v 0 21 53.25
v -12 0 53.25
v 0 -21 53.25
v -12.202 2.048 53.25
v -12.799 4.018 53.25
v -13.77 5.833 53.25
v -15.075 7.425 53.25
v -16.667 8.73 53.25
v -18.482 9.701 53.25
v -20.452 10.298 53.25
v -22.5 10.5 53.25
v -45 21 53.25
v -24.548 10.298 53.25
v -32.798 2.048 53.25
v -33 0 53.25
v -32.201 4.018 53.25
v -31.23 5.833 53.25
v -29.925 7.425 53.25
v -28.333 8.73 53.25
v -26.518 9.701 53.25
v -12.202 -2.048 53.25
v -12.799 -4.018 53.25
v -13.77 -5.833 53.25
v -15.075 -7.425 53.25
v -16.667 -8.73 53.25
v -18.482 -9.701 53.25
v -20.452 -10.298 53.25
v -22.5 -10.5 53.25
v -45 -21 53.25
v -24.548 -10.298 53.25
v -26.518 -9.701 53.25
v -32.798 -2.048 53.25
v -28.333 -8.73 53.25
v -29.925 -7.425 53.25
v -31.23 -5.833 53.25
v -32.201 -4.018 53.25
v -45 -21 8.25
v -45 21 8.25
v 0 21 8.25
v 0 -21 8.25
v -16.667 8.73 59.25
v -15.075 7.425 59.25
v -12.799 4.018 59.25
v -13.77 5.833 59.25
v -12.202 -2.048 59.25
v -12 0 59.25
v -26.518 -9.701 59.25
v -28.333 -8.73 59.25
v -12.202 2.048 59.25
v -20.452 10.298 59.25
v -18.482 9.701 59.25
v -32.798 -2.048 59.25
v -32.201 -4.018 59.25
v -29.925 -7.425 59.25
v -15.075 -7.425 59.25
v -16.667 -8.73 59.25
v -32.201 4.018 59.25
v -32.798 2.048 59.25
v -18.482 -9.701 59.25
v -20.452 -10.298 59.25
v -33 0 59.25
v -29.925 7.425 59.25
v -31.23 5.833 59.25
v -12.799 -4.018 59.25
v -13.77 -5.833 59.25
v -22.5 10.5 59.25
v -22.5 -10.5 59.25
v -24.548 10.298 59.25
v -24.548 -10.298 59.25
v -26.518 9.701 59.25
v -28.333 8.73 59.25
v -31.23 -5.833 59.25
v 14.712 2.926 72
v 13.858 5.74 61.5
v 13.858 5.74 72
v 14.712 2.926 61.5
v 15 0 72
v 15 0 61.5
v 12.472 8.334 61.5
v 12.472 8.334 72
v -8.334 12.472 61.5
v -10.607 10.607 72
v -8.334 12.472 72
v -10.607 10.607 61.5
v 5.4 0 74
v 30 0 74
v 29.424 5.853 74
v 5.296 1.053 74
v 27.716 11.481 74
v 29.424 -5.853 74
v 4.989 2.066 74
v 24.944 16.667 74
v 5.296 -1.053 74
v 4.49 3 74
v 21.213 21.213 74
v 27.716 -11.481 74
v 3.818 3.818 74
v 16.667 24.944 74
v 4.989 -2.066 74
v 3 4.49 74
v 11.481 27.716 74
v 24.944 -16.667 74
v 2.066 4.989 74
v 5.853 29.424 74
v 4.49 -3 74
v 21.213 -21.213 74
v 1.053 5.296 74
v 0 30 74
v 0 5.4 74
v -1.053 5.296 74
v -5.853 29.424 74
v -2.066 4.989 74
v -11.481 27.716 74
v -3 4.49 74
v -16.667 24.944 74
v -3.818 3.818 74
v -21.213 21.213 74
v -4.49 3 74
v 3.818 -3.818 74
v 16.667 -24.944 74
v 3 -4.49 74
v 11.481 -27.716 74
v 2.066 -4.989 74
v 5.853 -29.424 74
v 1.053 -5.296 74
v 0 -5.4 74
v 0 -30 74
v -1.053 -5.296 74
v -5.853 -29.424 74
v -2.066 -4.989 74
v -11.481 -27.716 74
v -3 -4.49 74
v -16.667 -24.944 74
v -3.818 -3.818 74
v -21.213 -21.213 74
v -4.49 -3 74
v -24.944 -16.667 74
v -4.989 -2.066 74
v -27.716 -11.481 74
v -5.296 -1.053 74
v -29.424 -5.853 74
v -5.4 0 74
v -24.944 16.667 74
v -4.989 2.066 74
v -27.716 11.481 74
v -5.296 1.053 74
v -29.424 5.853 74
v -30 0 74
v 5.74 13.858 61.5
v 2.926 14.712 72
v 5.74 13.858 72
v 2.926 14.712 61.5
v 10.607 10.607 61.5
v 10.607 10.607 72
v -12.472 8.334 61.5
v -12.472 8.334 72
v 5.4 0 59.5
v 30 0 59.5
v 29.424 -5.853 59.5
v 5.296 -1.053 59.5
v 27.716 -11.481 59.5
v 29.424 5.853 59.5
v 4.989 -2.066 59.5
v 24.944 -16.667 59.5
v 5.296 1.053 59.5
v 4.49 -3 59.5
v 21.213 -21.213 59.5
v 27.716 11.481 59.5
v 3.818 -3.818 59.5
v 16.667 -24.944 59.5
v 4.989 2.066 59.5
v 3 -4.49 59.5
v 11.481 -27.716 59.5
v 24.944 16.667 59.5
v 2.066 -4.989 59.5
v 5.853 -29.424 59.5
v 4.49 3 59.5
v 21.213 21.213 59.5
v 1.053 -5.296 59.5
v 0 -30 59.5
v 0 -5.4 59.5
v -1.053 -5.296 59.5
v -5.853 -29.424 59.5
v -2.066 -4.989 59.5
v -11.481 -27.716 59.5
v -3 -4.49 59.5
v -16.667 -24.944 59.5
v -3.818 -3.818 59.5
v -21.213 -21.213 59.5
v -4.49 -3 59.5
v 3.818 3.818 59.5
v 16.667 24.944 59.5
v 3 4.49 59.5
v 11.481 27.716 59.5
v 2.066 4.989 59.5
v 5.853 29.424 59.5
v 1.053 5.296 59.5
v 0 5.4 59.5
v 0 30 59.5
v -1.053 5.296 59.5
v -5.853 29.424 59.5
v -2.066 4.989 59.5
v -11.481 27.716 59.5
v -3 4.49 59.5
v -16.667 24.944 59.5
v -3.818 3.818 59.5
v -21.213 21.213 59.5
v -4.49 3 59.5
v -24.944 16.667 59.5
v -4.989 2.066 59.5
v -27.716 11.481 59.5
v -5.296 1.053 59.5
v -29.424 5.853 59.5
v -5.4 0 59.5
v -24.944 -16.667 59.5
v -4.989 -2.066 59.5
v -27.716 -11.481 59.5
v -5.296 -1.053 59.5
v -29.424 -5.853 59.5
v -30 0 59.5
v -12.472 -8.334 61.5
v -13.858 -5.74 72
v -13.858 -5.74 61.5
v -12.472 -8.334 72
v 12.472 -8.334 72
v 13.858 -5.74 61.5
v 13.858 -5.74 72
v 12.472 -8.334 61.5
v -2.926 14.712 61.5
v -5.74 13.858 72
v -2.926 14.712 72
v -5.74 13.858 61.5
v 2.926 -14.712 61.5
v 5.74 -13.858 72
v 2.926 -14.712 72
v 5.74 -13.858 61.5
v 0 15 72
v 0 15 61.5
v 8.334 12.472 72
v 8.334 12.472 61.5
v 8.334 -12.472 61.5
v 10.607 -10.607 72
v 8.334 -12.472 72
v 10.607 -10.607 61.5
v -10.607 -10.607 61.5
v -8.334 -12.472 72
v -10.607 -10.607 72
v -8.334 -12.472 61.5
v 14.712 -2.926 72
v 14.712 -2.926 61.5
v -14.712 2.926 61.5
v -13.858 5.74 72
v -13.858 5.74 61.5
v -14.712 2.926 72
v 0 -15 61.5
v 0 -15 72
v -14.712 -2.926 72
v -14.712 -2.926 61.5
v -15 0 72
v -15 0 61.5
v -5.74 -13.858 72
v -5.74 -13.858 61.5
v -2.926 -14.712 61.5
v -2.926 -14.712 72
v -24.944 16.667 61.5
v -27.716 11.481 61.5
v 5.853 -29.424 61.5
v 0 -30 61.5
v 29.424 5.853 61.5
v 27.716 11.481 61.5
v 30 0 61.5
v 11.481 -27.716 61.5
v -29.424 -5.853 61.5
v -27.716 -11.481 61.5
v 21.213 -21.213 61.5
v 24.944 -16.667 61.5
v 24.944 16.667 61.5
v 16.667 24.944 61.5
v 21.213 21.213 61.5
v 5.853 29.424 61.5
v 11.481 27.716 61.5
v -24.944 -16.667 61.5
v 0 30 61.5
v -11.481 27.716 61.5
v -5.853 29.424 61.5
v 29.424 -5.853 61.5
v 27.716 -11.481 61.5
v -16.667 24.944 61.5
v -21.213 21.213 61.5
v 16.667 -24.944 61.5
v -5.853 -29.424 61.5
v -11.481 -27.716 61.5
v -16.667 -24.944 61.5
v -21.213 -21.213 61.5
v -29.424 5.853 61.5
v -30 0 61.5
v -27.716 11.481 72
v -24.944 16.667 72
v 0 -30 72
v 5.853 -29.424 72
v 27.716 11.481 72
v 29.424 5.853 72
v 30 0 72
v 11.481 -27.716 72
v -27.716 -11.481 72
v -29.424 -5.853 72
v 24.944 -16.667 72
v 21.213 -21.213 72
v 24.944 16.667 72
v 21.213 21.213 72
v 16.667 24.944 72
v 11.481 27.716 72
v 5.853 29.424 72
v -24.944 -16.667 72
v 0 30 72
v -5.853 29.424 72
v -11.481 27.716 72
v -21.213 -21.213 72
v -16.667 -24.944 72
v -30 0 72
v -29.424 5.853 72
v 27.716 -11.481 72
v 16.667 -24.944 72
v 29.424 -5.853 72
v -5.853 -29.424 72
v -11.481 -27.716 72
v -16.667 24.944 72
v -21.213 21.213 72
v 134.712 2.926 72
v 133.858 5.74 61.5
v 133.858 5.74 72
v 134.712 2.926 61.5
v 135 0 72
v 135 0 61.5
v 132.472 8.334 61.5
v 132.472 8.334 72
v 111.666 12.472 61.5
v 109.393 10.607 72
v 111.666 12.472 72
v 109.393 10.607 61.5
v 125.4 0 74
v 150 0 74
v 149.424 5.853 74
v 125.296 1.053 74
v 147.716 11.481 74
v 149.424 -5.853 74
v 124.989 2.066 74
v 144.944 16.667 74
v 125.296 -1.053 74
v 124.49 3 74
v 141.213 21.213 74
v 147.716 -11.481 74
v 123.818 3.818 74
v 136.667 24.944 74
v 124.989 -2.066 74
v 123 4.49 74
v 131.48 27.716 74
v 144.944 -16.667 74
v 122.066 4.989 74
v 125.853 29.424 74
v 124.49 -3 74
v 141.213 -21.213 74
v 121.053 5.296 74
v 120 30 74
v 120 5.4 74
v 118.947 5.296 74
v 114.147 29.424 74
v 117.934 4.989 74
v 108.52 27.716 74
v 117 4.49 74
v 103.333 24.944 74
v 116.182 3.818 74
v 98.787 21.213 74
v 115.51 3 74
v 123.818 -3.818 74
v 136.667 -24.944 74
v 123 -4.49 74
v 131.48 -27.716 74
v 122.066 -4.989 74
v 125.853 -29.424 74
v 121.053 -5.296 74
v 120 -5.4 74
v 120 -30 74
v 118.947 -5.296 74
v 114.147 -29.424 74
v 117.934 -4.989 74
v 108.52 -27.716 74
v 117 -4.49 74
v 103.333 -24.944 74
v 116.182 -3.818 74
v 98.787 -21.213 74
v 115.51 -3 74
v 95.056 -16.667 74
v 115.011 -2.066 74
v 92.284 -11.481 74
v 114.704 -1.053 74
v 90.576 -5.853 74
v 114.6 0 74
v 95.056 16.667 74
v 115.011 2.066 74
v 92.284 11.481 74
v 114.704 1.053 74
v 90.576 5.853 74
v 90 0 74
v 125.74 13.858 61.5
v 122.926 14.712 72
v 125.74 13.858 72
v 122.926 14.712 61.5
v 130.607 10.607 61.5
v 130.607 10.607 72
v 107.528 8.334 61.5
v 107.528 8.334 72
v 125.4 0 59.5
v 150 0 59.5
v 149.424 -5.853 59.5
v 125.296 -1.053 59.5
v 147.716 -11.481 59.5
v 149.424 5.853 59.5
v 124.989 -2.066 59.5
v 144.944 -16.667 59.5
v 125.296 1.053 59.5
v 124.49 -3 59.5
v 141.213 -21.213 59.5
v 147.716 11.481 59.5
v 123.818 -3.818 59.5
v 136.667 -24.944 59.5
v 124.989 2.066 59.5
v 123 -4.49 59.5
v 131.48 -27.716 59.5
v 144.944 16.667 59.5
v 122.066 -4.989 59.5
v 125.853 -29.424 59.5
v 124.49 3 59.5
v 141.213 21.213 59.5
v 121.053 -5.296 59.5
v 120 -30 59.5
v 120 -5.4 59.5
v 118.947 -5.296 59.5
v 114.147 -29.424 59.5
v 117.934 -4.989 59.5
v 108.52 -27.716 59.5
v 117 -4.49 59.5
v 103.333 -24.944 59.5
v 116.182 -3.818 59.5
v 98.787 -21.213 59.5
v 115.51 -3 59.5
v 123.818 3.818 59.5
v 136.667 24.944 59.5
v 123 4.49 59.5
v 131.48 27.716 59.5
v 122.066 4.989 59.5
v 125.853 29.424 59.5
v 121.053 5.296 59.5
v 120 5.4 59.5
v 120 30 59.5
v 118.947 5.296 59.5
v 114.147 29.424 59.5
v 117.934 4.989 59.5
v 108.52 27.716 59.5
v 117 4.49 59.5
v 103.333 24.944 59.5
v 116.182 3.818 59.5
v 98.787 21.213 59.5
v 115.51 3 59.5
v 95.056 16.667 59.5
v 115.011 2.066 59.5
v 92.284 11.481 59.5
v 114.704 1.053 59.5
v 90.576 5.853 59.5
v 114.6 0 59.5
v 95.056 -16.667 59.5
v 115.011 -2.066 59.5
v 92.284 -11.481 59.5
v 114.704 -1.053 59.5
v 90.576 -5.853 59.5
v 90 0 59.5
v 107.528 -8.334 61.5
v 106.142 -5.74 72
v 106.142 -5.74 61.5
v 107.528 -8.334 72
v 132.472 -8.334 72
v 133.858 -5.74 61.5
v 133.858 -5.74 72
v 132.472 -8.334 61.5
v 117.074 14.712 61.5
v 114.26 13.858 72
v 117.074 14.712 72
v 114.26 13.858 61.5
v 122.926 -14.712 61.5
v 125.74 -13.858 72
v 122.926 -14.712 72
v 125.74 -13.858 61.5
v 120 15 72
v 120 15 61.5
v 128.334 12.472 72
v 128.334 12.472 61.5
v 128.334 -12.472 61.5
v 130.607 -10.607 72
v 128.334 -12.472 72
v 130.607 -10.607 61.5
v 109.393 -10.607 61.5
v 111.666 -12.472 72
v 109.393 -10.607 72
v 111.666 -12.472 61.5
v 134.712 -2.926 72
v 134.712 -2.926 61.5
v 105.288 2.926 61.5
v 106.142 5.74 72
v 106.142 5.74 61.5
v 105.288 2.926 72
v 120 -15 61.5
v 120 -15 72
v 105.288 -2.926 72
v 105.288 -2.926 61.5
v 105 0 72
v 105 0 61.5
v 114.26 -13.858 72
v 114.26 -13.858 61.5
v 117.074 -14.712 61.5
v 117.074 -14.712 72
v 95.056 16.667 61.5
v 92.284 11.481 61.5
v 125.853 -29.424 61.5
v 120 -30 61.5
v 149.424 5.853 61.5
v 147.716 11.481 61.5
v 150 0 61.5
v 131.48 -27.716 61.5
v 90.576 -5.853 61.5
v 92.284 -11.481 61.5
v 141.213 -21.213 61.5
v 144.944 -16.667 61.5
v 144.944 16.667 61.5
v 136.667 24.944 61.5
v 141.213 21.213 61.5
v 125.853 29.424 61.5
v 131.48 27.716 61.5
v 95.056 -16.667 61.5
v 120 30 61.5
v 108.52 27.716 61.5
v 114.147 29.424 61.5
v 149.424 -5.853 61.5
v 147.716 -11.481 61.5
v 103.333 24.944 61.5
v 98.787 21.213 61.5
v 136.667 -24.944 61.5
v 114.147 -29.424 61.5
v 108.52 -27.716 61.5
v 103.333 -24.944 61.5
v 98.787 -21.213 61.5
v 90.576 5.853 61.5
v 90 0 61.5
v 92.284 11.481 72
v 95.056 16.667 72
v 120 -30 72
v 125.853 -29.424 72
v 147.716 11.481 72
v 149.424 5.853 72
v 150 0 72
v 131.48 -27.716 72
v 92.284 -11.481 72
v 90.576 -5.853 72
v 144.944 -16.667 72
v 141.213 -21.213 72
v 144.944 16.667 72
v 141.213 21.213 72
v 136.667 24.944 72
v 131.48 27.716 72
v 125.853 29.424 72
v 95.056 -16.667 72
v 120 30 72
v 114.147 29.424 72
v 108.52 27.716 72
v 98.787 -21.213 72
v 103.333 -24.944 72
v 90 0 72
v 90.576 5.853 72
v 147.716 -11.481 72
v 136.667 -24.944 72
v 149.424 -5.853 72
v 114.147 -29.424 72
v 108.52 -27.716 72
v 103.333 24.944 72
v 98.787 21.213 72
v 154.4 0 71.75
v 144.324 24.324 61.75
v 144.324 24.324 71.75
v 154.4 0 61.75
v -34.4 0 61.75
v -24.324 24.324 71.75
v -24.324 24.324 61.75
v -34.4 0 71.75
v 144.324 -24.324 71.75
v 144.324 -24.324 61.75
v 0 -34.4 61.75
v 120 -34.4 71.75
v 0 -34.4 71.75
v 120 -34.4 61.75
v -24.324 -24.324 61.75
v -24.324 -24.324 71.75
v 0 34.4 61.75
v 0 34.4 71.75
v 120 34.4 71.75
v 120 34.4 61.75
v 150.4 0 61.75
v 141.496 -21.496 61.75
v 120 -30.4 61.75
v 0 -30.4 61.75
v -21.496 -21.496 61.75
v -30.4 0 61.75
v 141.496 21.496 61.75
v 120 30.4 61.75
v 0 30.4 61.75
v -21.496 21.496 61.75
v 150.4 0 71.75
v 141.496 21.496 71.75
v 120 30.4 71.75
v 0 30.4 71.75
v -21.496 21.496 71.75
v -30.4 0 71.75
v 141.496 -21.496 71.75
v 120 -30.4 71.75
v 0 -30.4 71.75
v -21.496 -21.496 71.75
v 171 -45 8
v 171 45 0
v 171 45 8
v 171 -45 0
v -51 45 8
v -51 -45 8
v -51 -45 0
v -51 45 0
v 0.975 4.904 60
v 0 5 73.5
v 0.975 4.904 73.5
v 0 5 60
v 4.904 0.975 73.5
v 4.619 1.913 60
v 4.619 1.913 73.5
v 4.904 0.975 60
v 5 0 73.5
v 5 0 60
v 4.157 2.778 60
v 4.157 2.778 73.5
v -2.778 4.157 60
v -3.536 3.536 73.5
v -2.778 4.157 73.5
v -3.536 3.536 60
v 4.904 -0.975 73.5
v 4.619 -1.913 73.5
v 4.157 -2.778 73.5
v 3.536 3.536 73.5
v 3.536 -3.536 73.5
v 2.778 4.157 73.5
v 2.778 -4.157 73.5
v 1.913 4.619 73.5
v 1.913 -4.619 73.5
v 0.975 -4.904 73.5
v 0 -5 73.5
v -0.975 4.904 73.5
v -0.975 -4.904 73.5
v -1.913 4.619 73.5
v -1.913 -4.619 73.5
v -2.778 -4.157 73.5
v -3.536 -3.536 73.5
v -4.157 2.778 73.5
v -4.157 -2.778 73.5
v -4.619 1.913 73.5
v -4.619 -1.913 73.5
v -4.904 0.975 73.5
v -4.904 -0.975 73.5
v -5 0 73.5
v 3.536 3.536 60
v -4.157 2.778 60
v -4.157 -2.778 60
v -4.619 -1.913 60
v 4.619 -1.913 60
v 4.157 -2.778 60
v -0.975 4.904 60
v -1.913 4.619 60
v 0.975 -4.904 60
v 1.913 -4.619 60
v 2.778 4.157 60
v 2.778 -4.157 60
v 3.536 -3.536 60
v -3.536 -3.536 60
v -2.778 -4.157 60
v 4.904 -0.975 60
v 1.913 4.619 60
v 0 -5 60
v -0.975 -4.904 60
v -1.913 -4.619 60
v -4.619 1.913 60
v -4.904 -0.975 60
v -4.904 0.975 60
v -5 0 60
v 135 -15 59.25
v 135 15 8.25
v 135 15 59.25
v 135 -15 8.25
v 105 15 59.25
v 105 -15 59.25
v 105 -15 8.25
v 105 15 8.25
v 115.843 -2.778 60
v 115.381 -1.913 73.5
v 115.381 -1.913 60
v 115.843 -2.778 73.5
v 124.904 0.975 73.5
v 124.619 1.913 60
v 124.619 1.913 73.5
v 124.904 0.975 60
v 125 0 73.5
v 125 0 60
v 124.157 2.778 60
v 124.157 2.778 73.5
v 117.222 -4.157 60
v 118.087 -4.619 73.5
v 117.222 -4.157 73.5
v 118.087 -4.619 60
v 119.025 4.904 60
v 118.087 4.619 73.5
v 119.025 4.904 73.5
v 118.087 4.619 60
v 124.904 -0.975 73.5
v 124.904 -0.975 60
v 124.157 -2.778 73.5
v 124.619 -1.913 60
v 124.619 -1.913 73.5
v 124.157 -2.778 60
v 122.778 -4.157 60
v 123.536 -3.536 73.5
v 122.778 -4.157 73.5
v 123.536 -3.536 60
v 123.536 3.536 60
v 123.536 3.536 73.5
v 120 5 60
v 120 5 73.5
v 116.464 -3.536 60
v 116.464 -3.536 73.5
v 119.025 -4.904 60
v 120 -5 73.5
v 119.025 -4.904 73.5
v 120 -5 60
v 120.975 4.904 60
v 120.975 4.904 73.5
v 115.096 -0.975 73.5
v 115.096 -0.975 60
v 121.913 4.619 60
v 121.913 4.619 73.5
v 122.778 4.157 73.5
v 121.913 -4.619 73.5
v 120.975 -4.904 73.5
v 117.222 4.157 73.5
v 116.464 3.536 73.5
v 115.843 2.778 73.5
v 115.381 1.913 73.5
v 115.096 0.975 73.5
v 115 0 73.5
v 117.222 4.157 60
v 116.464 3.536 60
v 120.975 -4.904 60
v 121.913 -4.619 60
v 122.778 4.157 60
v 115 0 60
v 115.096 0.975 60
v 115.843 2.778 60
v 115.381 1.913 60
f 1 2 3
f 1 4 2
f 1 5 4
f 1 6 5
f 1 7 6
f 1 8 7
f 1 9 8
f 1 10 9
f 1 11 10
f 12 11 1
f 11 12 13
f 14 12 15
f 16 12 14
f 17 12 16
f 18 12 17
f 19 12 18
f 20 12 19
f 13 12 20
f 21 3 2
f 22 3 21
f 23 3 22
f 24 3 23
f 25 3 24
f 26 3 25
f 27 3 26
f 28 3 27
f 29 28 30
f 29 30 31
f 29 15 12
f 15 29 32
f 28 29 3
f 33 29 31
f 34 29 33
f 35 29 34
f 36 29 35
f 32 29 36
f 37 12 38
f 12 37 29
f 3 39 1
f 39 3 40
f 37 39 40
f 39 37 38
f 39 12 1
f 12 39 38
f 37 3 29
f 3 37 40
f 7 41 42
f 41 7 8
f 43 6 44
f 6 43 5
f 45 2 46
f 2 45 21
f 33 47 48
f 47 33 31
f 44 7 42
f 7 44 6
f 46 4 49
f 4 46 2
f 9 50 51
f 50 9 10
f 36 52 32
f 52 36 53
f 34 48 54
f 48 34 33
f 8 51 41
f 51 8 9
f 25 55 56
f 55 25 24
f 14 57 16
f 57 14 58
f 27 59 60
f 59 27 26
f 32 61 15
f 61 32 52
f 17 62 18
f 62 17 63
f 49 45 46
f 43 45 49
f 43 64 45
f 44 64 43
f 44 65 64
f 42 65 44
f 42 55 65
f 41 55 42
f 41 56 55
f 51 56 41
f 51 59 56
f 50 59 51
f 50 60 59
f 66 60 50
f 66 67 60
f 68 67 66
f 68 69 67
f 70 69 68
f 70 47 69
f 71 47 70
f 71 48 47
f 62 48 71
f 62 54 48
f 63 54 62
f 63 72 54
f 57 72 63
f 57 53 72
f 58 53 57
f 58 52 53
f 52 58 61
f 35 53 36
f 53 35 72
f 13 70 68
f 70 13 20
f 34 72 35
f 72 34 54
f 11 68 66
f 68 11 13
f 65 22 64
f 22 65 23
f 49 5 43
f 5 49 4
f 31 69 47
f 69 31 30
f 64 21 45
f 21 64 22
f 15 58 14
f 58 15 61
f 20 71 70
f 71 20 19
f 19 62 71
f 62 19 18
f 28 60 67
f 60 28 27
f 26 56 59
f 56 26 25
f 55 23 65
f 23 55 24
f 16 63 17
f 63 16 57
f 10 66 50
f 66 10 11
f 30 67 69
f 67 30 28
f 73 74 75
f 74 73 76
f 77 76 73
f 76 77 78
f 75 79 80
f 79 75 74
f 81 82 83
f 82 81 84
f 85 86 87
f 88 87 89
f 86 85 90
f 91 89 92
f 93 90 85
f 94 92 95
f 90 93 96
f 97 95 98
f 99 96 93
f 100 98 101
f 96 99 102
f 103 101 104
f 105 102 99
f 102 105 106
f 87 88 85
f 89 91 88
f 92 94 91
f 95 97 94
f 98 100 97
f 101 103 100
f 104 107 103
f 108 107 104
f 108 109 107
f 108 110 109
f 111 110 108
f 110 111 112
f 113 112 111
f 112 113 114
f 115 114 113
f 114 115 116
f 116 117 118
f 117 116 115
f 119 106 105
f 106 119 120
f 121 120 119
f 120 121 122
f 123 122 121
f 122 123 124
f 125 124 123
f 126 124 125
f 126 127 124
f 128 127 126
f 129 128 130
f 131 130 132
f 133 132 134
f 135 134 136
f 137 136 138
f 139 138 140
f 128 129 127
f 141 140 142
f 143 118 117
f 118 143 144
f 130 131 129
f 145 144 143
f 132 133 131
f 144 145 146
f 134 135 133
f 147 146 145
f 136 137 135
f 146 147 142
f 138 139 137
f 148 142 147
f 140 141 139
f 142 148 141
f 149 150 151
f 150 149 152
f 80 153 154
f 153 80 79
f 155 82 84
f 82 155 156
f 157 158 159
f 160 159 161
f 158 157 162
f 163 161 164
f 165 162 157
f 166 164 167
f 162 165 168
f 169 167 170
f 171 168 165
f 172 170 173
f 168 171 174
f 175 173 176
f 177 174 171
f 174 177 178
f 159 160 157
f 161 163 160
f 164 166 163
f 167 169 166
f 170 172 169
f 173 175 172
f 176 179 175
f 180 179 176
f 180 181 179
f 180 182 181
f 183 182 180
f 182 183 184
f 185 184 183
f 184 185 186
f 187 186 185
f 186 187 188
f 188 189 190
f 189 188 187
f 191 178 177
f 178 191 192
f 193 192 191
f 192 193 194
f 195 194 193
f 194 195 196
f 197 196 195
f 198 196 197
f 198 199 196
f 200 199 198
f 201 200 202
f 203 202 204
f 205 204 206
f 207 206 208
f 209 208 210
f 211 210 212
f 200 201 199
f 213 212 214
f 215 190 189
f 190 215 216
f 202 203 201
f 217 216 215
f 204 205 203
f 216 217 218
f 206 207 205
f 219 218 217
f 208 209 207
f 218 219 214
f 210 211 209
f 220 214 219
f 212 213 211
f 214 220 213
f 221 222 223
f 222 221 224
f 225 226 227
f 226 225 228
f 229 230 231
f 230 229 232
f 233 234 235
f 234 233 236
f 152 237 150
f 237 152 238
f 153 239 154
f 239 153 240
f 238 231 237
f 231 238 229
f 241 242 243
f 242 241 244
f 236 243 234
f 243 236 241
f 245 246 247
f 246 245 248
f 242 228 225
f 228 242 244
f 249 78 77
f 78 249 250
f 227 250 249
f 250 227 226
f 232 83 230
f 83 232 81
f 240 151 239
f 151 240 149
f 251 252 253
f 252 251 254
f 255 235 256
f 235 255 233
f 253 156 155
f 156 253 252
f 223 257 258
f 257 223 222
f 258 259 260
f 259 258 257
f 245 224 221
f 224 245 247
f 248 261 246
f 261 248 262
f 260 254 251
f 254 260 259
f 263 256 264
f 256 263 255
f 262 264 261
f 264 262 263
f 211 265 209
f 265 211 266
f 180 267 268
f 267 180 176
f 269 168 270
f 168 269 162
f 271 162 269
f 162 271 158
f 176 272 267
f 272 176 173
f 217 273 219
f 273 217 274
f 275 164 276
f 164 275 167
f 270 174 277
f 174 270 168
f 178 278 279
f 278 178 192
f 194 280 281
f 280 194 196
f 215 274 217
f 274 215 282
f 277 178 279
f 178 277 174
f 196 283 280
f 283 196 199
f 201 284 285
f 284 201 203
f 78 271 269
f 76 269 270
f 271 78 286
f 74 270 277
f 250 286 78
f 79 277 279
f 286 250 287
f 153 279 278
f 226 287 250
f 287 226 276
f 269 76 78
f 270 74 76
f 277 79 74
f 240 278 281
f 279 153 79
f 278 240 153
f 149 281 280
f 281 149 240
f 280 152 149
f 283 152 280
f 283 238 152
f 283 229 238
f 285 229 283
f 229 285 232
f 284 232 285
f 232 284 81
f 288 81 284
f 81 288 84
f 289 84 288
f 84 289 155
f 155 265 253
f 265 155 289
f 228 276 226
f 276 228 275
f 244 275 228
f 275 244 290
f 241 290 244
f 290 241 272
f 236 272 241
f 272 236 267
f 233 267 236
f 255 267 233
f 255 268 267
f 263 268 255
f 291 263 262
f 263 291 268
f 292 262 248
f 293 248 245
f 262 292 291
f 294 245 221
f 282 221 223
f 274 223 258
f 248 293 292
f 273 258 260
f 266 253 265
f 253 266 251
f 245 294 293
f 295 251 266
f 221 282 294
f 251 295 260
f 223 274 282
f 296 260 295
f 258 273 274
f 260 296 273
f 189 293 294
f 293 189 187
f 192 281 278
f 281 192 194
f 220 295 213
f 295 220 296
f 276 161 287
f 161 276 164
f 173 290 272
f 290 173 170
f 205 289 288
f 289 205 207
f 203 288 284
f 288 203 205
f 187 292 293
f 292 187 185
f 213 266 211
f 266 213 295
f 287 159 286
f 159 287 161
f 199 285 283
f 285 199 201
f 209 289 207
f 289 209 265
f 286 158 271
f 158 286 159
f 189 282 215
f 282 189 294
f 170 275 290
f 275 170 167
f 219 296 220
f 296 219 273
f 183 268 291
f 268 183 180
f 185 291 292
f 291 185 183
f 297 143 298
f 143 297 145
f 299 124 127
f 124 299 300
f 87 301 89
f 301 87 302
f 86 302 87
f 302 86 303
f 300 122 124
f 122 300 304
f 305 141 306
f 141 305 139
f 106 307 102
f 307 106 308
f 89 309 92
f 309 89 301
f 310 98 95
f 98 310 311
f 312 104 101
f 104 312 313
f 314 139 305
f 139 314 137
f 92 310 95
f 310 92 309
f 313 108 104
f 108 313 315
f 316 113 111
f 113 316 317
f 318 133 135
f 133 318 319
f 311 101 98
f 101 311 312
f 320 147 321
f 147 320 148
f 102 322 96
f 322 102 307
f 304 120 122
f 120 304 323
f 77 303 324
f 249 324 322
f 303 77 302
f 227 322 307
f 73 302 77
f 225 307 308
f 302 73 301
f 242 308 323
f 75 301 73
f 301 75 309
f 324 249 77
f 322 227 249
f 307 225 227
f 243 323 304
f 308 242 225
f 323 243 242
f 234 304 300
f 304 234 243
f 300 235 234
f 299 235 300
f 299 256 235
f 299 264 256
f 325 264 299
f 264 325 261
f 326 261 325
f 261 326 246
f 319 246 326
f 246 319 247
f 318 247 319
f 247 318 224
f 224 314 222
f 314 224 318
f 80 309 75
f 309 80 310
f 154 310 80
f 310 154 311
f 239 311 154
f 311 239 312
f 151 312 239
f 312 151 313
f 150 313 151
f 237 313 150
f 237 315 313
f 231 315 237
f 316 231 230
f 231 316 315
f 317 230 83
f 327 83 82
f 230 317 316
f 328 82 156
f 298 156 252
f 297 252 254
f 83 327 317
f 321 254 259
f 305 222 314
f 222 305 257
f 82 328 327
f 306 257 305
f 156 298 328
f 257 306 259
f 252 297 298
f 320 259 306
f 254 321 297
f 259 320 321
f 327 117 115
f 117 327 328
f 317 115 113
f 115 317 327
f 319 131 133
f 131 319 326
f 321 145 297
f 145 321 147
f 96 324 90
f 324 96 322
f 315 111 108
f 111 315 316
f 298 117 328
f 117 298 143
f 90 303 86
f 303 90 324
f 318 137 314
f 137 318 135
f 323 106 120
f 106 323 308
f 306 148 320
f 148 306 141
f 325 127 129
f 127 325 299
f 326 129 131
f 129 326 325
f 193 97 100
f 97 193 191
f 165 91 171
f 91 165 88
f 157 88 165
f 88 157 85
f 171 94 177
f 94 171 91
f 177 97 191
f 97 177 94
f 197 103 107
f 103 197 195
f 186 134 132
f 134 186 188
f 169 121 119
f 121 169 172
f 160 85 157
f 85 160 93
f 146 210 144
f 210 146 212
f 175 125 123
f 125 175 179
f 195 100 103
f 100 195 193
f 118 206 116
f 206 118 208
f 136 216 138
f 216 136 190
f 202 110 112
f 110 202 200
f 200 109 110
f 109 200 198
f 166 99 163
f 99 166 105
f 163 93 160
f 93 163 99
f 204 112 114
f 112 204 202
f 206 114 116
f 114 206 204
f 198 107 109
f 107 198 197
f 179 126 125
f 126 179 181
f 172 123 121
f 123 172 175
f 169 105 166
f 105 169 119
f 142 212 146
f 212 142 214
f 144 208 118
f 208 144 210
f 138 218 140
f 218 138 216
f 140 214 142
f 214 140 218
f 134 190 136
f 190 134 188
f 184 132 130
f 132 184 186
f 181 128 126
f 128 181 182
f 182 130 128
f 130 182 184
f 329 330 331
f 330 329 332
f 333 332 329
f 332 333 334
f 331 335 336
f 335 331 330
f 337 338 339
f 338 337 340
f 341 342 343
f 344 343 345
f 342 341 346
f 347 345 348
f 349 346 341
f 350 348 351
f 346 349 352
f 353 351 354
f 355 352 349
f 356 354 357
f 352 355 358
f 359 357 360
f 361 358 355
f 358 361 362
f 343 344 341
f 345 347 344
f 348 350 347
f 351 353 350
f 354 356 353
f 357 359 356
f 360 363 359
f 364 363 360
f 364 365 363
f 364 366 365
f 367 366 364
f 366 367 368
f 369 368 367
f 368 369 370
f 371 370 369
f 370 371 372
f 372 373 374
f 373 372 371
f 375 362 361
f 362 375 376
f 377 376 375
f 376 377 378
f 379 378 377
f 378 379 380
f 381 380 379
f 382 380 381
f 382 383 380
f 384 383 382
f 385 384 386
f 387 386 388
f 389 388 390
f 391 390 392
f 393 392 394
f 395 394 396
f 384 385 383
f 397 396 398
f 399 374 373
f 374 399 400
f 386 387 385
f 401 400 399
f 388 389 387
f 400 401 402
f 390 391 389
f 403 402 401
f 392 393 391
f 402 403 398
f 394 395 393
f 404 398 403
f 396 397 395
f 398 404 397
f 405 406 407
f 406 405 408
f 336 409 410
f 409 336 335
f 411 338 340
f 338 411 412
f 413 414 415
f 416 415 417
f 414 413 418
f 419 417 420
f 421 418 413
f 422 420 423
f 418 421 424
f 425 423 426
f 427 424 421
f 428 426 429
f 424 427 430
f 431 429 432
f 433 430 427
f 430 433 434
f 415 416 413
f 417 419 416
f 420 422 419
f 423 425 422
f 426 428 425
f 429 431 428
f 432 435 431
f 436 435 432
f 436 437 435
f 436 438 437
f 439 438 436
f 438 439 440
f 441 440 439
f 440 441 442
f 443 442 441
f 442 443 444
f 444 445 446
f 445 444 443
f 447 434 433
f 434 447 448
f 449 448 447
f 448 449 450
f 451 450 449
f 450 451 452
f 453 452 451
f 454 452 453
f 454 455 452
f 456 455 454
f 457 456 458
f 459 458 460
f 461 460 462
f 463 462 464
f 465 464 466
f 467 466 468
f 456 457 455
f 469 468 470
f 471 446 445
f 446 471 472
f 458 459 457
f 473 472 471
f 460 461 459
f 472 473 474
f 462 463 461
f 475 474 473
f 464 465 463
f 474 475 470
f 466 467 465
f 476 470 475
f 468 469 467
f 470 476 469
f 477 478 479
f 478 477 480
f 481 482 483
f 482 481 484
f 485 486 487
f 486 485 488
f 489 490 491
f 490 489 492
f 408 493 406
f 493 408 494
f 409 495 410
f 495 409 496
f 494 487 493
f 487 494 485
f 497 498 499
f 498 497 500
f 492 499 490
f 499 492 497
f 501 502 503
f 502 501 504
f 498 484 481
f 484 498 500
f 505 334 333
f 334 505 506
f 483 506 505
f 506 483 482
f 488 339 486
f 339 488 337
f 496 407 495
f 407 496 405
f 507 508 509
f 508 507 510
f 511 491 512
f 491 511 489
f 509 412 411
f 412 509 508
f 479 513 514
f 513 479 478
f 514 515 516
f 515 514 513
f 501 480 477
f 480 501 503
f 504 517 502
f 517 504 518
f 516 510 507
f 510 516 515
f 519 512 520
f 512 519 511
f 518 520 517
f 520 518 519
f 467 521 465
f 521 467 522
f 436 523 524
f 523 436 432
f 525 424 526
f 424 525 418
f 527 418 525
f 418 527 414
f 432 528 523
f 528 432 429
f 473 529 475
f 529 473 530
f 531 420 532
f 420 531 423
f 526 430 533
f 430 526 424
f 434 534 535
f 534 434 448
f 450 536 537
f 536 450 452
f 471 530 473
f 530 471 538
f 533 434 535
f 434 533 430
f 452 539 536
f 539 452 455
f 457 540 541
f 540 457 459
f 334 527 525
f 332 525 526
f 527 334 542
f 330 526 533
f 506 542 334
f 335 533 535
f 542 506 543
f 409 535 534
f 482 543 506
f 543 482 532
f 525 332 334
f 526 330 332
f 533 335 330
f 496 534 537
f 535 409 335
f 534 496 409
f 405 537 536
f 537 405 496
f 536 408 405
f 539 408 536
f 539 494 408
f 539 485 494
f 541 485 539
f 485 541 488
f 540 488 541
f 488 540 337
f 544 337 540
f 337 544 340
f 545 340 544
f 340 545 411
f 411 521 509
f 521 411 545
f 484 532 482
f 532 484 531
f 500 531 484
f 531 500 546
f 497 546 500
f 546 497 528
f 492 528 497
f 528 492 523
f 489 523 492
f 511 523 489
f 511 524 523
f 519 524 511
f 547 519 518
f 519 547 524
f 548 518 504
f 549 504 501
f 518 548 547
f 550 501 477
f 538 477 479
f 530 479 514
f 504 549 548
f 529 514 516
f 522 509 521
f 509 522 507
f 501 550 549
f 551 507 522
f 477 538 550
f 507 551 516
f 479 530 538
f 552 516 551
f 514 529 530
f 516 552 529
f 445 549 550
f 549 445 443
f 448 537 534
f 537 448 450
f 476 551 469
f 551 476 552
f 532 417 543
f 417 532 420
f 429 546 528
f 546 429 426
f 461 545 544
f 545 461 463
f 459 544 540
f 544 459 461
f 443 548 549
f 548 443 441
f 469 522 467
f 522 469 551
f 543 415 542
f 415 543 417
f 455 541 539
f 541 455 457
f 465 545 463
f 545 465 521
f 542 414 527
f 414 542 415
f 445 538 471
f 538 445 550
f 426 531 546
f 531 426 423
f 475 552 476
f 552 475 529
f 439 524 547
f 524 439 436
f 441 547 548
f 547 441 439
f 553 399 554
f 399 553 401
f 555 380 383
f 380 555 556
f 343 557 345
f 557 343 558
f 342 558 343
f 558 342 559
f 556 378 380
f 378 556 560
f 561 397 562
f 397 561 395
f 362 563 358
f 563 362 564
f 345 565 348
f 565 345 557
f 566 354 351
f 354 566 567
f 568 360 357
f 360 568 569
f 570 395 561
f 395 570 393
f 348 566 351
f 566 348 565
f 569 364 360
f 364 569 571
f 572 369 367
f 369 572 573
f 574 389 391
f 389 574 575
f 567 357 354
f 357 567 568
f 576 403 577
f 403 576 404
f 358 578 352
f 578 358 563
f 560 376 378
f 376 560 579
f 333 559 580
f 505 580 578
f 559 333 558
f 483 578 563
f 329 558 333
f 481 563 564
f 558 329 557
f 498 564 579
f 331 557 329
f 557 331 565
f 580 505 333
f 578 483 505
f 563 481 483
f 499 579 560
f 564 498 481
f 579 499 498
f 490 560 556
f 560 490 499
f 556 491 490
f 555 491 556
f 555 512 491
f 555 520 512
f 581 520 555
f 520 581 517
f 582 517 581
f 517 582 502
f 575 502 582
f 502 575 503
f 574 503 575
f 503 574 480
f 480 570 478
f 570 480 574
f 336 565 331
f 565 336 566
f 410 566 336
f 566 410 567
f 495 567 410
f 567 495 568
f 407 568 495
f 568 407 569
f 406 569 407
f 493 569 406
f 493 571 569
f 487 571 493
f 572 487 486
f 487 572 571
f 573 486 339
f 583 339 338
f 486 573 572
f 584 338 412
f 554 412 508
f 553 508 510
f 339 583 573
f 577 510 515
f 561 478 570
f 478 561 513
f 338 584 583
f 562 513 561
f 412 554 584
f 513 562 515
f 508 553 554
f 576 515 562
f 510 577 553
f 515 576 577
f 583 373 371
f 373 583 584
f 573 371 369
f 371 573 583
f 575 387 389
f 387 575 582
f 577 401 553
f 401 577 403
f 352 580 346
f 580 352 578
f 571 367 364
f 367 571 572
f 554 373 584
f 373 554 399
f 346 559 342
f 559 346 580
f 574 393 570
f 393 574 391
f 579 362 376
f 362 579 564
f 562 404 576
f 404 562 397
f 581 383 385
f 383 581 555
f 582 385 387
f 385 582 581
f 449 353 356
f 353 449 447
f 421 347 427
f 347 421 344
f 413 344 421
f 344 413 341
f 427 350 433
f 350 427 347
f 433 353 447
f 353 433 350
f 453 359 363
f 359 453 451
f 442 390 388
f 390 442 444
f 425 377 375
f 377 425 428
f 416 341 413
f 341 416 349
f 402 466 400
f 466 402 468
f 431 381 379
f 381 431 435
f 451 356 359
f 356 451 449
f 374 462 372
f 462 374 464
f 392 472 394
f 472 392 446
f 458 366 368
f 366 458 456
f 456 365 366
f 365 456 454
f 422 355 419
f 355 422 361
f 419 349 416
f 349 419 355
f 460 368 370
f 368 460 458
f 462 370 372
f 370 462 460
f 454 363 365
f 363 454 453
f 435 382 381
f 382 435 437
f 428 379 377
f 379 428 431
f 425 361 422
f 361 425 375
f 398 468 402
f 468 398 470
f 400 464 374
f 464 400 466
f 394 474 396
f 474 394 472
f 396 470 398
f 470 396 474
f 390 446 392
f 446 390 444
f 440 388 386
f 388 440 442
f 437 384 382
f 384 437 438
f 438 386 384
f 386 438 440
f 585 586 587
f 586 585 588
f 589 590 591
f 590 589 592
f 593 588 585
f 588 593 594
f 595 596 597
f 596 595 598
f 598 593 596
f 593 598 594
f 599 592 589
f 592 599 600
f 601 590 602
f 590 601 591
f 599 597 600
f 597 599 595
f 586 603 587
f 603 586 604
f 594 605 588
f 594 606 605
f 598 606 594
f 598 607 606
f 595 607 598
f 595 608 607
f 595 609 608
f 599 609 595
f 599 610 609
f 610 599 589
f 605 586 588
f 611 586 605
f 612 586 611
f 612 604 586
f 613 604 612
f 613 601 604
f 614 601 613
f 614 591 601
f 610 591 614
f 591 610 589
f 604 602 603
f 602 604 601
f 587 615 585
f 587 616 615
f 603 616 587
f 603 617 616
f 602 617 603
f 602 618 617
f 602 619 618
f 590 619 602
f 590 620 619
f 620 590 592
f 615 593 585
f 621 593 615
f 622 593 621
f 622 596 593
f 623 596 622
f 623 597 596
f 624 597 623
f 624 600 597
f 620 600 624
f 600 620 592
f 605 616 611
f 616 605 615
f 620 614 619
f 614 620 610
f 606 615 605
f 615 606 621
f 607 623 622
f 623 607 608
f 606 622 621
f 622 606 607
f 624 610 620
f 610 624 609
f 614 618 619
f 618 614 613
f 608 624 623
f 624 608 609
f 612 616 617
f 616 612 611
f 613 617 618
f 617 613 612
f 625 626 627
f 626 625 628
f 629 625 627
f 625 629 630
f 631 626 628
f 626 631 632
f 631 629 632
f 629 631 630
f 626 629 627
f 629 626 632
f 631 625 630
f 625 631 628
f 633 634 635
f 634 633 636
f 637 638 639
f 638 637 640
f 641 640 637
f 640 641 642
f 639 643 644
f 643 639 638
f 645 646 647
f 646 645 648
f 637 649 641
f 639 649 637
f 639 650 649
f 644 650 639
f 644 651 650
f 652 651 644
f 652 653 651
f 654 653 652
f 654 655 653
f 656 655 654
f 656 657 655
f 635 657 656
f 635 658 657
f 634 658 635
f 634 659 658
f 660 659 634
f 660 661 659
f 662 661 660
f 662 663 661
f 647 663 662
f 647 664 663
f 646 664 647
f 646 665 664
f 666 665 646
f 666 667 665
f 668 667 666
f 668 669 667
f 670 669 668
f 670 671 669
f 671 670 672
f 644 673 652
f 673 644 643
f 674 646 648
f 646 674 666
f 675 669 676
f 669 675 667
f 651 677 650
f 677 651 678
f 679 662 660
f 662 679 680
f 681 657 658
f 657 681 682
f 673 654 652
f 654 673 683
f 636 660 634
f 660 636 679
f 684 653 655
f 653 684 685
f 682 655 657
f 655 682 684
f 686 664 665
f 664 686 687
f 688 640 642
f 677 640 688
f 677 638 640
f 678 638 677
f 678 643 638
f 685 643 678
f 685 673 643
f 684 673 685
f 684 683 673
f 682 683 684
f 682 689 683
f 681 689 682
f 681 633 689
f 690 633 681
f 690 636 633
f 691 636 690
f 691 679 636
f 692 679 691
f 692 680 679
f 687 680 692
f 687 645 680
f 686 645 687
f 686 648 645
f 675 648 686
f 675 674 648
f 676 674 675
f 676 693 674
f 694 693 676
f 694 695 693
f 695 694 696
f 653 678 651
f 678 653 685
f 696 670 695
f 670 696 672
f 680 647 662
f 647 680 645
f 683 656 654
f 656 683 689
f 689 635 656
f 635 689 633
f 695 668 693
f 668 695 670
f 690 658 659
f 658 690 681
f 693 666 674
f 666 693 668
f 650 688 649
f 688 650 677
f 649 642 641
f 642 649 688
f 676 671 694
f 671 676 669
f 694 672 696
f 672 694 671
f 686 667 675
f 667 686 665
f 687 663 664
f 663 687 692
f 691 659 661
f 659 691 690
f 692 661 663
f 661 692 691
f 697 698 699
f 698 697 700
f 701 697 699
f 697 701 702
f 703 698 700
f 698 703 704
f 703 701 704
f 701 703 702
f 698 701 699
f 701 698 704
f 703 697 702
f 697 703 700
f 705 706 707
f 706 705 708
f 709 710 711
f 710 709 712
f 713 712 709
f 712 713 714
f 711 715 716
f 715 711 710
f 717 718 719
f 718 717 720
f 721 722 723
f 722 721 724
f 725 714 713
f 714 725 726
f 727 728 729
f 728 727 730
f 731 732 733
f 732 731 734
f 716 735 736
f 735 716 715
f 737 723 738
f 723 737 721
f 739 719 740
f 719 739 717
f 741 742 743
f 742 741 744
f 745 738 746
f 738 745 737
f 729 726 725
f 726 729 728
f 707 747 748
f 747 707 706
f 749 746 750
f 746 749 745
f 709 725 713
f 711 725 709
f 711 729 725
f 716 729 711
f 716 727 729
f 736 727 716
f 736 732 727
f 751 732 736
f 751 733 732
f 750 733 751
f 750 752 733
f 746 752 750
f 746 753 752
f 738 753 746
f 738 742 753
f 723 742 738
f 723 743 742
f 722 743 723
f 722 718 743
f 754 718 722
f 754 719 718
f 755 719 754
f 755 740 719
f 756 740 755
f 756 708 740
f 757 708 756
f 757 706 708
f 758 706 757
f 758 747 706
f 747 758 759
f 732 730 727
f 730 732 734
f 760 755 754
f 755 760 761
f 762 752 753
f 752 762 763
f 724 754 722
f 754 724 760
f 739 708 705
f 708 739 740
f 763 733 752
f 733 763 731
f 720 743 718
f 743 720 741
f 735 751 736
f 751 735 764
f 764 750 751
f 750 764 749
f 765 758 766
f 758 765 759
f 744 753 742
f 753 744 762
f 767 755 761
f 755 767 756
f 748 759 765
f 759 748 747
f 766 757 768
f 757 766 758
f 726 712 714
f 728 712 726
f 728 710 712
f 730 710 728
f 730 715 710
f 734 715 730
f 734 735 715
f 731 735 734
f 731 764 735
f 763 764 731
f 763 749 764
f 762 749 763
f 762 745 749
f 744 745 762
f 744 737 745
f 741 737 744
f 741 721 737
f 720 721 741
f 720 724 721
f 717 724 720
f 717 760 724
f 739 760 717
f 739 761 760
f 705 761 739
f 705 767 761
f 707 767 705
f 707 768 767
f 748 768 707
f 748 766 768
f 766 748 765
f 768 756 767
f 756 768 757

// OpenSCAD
$fn = 32;

// ------------------------------------------------------------------------
// Motor belt drive: span 120 mm, pulleys d60, belt 10 mm wide
// Every part is its own module, assembly() places every instance.
// ------------------------------------------------------------------------

// --- part 1 ---
module base_plate() {
  difference() {
    translate([-111, -45, 0]) cube([222, 90, 8]);
  }
}

// --- part 2 ---
module motor() {
  union() {
    translate([-22.5, -21, 0]) cube([45, 42, 45]);
    translate([25.5, 0, 22.5]) rotate([0, 90, 0]) cylinder(h = 6, d = 21, center = true);
  }
}

// --- part 3 ---
module drive_shaft() {
  translate([0, 0, -6.75]) cylinder(h = 13.5, d = 10);
}

// --- part 4 ---
module pulley_drive() {
  difference() {
    union() {
      cylinder(h = 14.5, d = 30);
      cylinder(h = 2, d = 60);
      translate([0, 0, 12.5]) cylinder(h = 2, d = 60);
    }
    translate([0, 0, -1]) cylinder(h = 16.5, d = 10.8);
  }
}

// --- part 5 ---
module idler_post() {
  translate([-15, -15, 0]) cube([30, 30, 51]);
}

// --- part 6 ---
module driven_shaft() {
  translate([0, 0, -6.75]) cylinder(h = 13.5, d = 10);
}

// --- part 7 ---
module pulley_driven() {
  difference() {
    union() {
      cylinder(h = 14.5, d = 30);
      cylinder(h = 2, d = 60);
      translate([0, 0, 12.5]) cylinder(h = 2, d = 60);
    }
    translate([0, 0, -1]) cylinder(h = 16.5, d = 10.8);
  }
}

// --- part 8 ---
module drive_belt() {
  difference() {
    linear_extrude(height = 10) polygon(points = concat([for (a = [90 : 45 : 270]) [34.4 * cos(a), 34.4 * sin(a)]], [for (a = [270 : 45 : 450]) [120 + 34.4 * cos(a), 34.4 * sin(a)]]));
    translate([0, 0, -1]) linear_extrude(height = 12) polygon(points = concat([for (a = [90 : 45 : 270]) [30.4 * cos(a), 30.4 * sin(a)]], [for (a = [270 : 45 : 450]) [120 + 30.4 * cos(a), 30.4 * sin(a)]]));
  }
}

// --- assembly ---
module assembly() {
  color([0.80, 0.24, 0.20]) translate([60, 0, 0]) rotate([0, 0, 0]) base_plate();
  color([0.20, 0.45, 0.75]) translate([0, 0, 30.75]) rotate([0, 270, 0]) motor();
  color([0.25, 0.62, 0.32]) translate([0, 0, 66.75]) rotate([0, 0, 0]) drive_shaft();
  color([0.92, 0.70, 0.18]) translate([0, 0, 59.5]) rotate([0, 0, 0]) pulley_drive();
  color([0.58, 0.35, 0.70]) translate([120, 0, 8.25]) rotate([0, 0, 0]) idler_post();
  color([0.16, 0.66, 0.66]) translate([120, 0, 66.75]) rotate([0, 0, 0]) driven_shaft();
  color([0.85, 0.48, 0.18]) translate([120, 0, 59.5]) rotate([0, 0, 0]) pulley_driven();
  color([0.55, 0.60, 0.65]) translate([0, 0, 61.75]) rotate([0, 0, 0]) drive_belt();
}

assembly();
